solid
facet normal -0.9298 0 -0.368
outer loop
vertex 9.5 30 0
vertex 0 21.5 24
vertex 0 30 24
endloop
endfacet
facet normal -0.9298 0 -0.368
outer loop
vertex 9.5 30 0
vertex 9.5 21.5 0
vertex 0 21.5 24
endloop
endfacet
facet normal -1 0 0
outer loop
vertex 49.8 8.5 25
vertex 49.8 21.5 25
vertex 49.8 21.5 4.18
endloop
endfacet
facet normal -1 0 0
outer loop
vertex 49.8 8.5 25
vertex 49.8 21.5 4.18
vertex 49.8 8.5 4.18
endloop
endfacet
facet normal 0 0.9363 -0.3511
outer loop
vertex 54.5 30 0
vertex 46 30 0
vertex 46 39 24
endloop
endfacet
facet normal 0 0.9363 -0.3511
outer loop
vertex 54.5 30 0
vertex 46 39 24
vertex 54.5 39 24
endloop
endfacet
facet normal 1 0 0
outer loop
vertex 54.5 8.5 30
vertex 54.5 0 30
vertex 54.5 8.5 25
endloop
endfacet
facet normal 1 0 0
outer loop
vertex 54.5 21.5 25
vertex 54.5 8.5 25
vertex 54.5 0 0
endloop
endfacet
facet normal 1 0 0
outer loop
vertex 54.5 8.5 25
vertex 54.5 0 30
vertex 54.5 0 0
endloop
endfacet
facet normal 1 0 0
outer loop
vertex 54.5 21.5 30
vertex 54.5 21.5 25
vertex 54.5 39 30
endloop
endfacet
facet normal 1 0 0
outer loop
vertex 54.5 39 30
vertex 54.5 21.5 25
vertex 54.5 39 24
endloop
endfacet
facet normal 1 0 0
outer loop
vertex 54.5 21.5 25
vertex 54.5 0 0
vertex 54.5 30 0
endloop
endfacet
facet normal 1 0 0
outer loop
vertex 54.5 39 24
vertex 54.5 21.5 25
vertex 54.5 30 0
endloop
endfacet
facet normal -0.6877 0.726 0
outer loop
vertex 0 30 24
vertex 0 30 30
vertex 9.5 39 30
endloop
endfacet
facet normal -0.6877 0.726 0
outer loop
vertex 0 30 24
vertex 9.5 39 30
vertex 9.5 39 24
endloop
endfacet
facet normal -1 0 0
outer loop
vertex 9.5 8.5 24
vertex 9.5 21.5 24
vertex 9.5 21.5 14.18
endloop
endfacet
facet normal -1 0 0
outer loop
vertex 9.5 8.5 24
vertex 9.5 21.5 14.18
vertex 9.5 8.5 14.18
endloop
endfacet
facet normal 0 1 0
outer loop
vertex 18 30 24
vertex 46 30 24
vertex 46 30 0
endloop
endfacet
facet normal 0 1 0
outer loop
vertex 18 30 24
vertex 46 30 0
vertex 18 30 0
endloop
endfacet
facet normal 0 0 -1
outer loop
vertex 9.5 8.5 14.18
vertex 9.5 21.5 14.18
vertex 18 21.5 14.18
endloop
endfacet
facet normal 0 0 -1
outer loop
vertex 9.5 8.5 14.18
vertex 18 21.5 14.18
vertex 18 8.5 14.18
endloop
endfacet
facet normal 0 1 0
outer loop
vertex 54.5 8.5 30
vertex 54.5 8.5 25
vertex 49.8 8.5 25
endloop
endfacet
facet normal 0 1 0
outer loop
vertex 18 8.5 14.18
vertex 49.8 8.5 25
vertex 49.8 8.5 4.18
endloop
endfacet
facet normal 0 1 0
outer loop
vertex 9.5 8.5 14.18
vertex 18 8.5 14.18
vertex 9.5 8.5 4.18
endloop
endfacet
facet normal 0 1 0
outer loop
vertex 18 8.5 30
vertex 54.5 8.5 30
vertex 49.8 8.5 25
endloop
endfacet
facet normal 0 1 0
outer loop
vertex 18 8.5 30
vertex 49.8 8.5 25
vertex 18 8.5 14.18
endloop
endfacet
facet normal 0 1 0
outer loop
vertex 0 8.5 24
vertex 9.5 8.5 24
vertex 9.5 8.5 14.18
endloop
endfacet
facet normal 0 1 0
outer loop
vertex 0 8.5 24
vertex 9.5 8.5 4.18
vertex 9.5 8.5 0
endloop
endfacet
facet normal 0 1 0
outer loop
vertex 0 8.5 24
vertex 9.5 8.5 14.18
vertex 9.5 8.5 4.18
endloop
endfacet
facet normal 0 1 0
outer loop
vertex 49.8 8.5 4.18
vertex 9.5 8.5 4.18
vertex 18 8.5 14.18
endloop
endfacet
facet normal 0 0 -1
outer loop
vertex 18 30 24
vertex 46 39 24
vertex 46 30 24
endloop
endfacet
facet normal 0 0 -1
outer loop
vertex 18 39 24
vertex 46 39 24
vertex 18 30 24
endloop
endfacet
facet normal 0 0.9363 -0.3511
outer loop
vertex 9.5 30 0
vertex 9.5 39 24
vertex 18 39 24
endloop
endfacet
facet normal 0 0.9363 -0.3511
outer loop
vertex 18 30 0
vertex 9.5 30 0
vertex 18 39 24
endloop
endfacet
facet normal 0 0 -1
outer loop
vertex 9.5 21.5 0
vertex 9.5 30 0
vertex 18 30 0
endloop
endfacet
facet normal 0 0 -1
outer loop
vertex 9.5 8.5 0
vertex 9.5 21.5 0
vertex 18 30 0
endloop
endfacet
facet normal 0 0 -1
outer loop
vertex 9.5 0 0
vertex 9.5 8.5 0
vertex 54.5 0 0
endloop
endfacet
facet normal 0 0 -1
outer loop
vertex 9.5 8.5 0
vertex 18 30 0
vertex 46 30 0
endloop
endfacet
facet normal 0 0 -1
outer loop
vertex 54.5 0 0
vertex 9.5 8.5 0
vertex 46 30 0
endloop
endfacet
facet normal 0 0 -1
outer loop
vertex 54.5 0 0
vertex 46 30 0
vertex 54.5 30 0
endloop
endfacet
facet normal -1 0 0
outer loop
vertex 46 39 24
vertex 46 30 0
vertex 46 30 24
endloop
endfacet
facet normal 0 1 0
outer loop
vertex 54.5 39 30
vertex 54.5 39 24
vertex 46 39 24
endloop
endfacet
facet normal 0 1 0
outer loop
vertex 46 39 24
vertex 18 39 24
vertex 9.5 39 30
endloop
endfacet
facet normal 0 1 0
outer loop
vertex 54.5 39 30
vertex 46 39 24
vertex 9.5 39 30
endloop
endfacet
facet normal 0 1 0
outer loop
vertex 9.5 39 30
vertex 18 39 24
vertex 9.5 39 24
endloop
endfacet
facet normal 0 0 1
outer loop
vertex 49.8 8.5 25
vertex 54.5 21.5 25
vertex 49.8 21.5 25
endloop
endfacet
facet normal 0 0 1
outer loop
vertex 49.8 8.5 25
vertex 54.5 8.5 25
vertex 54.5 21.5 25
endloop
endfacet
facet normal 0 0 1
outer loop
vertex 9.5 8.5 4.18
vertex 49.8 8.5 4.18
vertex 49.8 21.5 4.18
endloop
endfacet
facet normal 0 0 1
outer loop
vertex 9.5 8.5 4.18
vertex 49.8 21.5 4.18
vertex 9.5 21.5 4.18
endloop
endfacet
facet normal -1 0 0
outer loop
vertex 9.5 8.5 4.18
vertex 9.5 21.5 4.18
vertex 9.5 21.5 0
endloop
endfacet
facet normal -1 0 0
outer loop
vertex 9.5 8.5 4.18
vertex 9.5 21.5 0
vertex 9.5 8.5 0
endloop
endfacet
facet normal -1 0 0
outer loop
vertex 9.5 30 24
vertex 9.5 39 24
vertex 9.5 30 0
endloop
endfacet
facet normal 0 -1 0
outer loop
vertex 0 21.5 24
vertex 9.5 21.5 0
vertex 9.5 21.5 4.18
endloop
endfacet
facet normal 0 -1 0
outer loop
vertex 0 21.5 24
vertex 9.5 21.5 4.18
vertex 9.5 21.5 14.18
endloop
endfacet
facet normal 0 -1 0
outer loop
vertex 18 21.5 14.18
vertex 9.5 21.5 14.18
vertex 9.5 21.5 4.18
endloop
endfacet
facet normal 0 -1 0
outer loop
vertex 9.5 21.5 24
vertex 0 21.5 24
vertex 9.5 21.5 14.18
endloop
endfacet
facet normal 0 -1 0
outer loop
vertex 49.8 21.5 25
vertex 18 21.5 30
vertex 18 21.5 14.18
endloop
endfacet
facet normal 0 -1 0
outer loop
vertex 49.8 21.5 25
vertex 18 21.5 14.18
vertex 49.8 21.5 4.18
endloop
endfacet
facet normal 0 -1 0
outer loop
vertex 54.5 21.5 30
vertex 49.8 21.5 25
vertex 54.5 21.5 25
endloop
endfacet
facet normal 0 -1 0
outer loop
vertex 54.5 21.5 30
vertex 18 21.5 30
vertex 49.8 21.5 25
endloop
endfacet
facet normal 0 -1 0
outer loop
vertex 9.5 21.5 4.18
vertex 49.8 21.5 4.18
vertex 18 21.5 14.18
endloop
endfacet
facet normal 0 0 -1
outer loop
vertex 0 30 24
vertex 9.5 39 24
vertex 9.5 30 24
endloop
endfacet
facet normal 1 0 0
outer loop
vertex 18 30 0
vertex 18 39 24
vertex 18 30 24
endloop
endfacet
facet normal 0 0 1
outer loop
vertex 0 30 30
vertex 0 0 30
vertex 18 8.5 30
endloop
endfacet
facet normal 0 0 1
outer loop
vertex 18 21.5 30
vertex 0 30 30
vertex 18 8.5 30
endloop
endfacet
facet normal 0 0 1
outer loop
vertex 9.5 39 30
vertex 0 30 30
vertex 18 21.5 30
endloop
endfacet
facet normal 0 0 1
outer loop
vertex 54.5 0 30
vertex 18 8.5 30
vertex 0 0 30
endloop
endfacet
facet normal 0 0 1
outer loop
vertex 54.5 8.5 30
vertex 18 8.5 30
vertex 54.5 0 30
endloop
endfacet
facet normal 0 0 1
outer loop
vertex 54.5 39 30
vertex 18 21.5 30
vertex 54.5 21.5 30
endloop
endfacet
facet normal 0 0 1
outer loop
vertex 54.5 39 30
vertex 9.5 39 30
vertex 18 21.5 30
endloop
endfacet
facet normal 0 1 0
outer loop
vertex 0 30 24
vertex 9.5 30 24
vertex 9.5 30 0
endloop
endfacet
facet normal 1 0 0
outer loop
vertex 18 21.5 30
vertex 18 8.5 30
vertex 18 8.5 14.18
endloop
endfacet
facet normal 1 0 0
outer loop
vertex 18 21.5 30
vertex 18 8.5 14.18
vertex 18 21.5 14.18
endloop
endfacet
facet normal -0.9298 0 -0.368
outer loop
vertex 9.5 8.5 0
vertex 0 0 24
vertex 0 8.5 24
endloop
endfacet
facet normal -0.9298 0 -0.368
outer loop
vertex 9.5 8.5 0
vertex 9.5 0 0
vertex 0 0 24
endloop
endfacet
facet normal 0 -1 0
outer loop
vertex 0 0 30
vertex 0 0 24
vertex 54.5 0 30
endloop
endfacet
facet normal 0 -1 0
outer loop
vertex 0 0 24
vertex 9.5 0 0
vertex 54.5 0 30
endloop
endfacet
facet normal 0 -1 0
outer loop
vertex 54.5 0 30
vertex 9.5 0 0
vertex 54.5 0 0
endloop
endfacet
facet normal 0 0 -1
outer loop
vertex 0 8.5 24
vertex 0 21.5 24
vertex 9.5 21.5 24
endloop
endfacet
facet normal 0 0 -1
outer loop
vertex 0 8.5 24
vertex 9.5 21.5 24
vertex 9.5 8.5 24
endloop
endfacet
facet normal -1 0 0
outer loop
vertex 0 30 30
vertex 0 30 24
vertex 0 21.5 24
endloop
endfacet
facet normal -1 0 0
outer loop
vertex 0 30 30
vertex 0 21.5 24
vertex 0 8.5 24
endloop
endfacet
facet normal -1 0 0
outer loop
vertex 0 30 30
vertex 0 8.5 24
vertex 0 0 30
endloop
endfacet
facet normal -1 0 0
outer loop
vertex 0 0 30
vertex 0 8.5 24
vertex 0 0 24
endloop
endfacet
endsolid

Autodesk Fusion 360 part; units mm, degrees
sketch "Colour Sensor Servo Seat Outline" plane through (0, 0, 0) normal (0, 0, 1) x (1, 0, 0)
  line L0 (0, 0) -> (54.5, 0)
  line L1 (54.5, 0) -> (54.5, 39)
  line L2 (54.5, 39) -> (0, 39)
  line L3 (0, 39) -> (0, 0)
  dimension "d1" = 39
  dimension "d2" = 54.5
extrude "Extrude1" add sketch "Colour Sensor Servo Seat Outline" along normal blind 30
sketch "Colour Sensor Servo Hole" plane through (0, 0, 30) normal (0, 0, 1) x (-1, 0, 0)
  line L0 (0, -39) -> (0, 0)
  line L1 (0, 0) -> (-54.5, 0)
  line L2 (-54.5, 0) -> (-54.5, -39)
  line L3 (-54.5, -39) -> (0, -39)
  line L4 (-54.5, -8.5) -> (-18, -8.5)
  line L5 (-18, -8.5) -> (-18, -21.5)
  line L6 (-18, -21.5) -> (-54.5, -21.5)
  line L7 (-54.5, -21.5) -> (-54.5, -8.5)
  line L8 (-54.5, 0) -> (-18, 0)
  line L9 (-18, 0) -> (-18, -30)
  line L10 (-18, -30) -> (-54.5, -30)
  line L11 (-54.5, -30) -> (-54.5, 0)
  line L12 (-54.5, -21.5) -> (-49.8, -21.5)
  line L13 (-49.8, -21.5) -> (-49.8, -8.5)
  line L14 (-49.8, -8.5) -> (-54.5, -8.5)
  line L15 (-54.5, -8.5) -> (-54.5, -21.5)
  point P0 (-54.5, -21.5)
  point P1 (-54.5, -30)
  dimension "d6" = 13
  dimension "d8" = 36.5
  dimension "d9" = 30
  dimension "d10" = 8.5
  dimension "d11" = 8.5
  dimension "d12" = 4.7
extrude "Extrude2" cut sketch "Colour Sensor Servo Hole" against normal blind 5 contours L2 L4 L6 L7 L11 L12 L13 L14 L15
extrude "Extrude3" cut sketch "Colour Sensor Servo Hole" against normal blind 25.82 contours L4 L5 L6 L9 L13
chamfer "Chamfer1" distance 24 distance2 9 1 edges at (27.25, 39, 0) measured on face at (36.3333, 39, 20)
sketch "Front Ribs" plane through (0, 39, 0) normal (0, 1, 0) x (-1, 0, 0)
  line L0 (-54.5, 24) -> (0, 24)
  line L1 (0, 24) -> (0, 30)
  line L2 (0, 30) -> (-54.5, 30)
  line L3 (-54.5, 30) -> (-54.5, 24)
  line L4 (0, 0) -> (0, 24)
  line L5 (0, 24) -> (-54.5, 24)
  line L6 (-54.5, 24) -> (-54.5, 0)
  line L7 (-54.5, 0) -> (0, 0)
  line L8 (-46, 24) -> (-18, 24)
  line L9 (-18, 24) -> (-18, 0)
  line L10 (-18, 0) -> (-46, 0)
  line L11 (-46, 0) -> (-46, 24)
  line L12 (-18, 24) -> (-9.5, 24)
  line L13 (-9.5, 24) -> (-9.5, 0)
  line L14 (-9.5, 0) -> (-18, 0)
  line L15 (-18, 0) -> (-18, 24)
  dimension "d26" = 8.5
  dimension "d31" = 8.5
  dimension "d39" = 9.5
extrude "Extrude4" cut sketch "Front Ribs" against normal blind 9 contours L0 L5 L7 L8 L9 L10 L11 L15 | L0 L4 L5 L7 L13
chamfer "Chamfer2" distance 24 distance2 9.5 1 edges at (0, 15, 0) measured on face at (0, 10, 18)
sketch "Side Ribs" plane through (0, 0, 0) normal (-1, 0, 0) x (0, -1, 0)
  line L0 (-30, 24) -> (0, 24)
  line L1 (0, 24) -> (0, 30)
  line L2 (0, 30) -> (-39, 30)
  line L3 (-39, 30) -> (-39, 24)
  line L4 (-39, 24) -> (-30, 24)
  line L5 (0, 0) -> (0, 24)
  line L6 (0, 24) -> (-30, 24)
  line L7 (-30, 24) -> (-30, 0)
  line L8 (-30, 0) -> (0, 0)
  line L9 (-21.5, 24) -> (-8.5, 24)
  line L10 (-8.5, 24) -> (-8.5, 0)
  line L11 (-8.5, 0) -> (-21.5, 0)
  line L12 (-21.5, 0) -> (-21.5, 24)
  dimension "d33" = 8.5
  dimension "d34" = 8.5
extrude "Extrude6" cut sketch "Side Ribs" against normal blind 9.5 contours L0 L6 L8 L9 L10 L11 L12
chamfer "Chamfer3" distance 9.5 distance2 9 1 edges at (0, 39, 27) measured on face at (24.1667, 39, 28)
sketch "Servo Cable Hole" plane through (9.5, 0, 0) normal (-1, 0, 0) x (0, -1, 0)
  line L0 (-21.5, 0) -> (-8.5, 0)
  line L1 (-8.5, 0) -> (-8.5, 24)
  line L2 (-8.5, 24) -> (-21.5, 24)
  line L3 (-21.5, 24) -> (-21.5, 0)
  line L4 (-21.5, 0) -> (-21.5, 24)
  line L5 (-21.5, 24) -> (-30, 24)
  line L6 (-30, 24) -> (-30, 0)
  line L7 (-30, 0) -> (-21.5, 0)
  line L8 (-8.5, 24) -> (-8.5, 0)
  line L9 (-8.5, 0) -> (0, 0)
  line L10 (0, 0) -> (0, 24)
  line L11 (0, 24) -> (-8.5, 24)
  line L12 (-21.5, 14.18) -> (-8.5, 14.18)
  line L13 (-8.5, 14.18) -> (-8.5, 4.18)
  line L14 (-8.5, 4.18) -> (-21.5, 4.18)
  line L15 (-21.5, 4.18) -> (-21.5, 14.18)
  dimension "d40" = 10
  dimension "d41" = 4.18
extrude "Extrude7" cut sketch "Servo Cable Hole" against normal blind 8.5 contours L1 L3 L4 L8 L12 L13 L14 L15
equation "d2 = servo_seat_width"
equation "d3 = servo_seat_height"
equation "servo_seat_height = 30 mm" comment "The height of the Colour Sensor Servo Seat component."
equation "d6 = servo_hole_width"
equation "servo_hole_width = 13 mm" comment "The width of the hole for the Colour Sensor Servo to sit in."
equation "d10 = ( 30 mm - servo_hole_width ) / 2"
equation "d13 = -servo_arm_support_depth"
equation "servo_arm_support_depth = 5 mm" comment "The depth to extrude to create the arm support for the Colour Sensor Servo."
equation "servo_hole_depth = 25.82 mm" comment "The depth to extrude to create the hole for the Colour Sensor Servo to sit in."
equation "d17 = -servo_hole_depth"
equation "d19 = servo_seat_height - top_support_thickness"
equation "d20 = 17.50 mm - 8.50 mm"
equation "top_support_thickness = 6 mm" comment "The thickness of the top supports that will go underneath the Colour Detection Mechanism Platform."
equation "d22 = -( 17.50 mm - 8.50 mm )"
equation "rib_thickness = 8.5 mm" comment "The thickness of the support ribs."
equation "d26 = rib_thickness"
equation "d27 = servo_seat_height - top_support_thickness"
equation "d28 = servo_seat_width - 36.50 mm - 8.5 mm"
equation "d31 = rib_thickness"
equation "servo_seat_width = 36.50 mm + 18 mm" comment "The width of the Colour Sensor Servo Seat component."
equation "d33 = rib_thickness"
equation "d34 = rib_thickness"
equation "d35 = -( servo_seat_width - 36.50 mm - 8.5 mm )"
equation "d37 = ( servo_seat_width - 36.50 mm - 8.5 mm )"
equation "d39 = ( servo_seat_width - 36.50 mm - 8.5 mm )"
equation "d41 = servo_seat_height - servo_hole_depth"
equation "d42 = -rib_thickness"
